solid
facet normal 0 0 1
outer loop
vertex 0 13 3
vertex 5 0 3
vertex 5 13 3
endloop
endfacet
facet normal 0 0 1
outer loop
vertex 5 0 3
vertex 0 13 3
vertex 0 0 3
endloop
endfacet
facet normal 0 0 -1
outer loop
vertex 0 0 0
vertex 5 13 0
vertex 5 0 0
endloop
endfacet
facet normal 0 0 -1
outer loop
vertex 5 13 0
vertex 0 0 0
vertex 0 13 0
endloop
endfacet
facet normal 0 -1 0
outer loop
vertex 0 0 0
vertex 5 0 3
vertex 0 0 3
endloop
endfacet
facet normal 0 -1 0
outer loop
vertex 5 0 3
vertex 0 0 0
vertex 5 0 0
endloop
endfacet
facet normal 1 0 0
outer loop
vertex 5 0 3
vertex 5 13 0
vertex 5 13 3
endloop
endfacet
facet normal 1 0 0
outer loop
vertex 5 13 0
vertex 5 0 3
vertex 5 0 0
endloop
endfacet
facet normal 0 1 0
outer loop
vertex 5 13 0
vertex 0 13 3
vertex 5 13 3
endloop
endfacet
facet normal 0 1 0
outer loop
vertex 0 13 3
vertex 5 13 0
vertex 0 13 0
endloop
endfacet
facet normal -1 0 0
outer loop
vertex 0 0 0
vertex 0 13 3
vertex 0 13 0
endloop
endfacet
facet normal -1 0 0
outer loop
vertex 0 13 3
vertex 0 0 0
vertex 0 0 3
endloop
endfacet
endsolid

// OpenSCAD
// Generated by SolidPython 1.0.1 on 2020-07-29 00:46:54


cube(size = [5, 13, 3]);
/***********************************************
*********      SolidPython code:      **********
************************************************
 
# import packages: SolidPython
from solid import *
from solid.utils import *
from itertools import chain, combinations, permutations


class Resize:

    def __init__(self, scad_file):
        self.scad_file = scad_file
        #self.scad_file = import_scad(scad_file)
        # cone/cylinder param:
        self.r1 = 0
        self.r2 = 0
        self.h = 0
        # rectangular prism param:
        self.w = 0
        self.l = 0
        # ellipse param:
        self.r = 0

    # import OpenScad code (file name corresponds to shape)


    # classify shape + parameters
    def assign(self, param1, param2, param3):
        if self.scad_file == 'cone.scad':
            self.r1 = param1
            self.r2 = param2
            self.h = param3
        elif self.scad_file == 'cylinder.scad':
            self.r1 = param1
            self.r2 = param2
            self.h = param3
        elif self.scad_file == 'rectangularPrism.scad':
            self.h = param1
            self.l = param2
            self.w = param3
        else:
            self.r = param1
            self.h = param2

    # resize parameters
    def iterate(self):
        x = range(3, 20, 2)
        i = 1
        if self.scad_file == 'cone.scad':
            tempList = list(permutations(x, 2))
            for temp in tempList:
                param1 = temp[0]
                param2 = temp[1]
                filepath = 'produced_scad_files/' + 'cone' + str(param1) + '_' + str(param2) + '_' + '.scad'
                scad_render_to_file(cylinder(h=param1, r1=param2, r2=0), filepath)

        elif self.scad_file == 'cylinder.scad':
            tempList = list(permutations(x, 3))
            for temp in tempList:
                param1 = temp[0]
                param2 = temp[1]
                filepath = 'produced_scad_files/' + 'cylinder' + str(param1) + '_' + str(param2) + '_' + '.scad'
                scad_render_to_file(cylinder(h=param1, r1=param2, r2=param2), filepath)

        elif self.scad_file == 'rectangularPrism.scad':
            tempList = list(permutations(x, 3))
            for temp in tempList:
                param1 = temp[0]
                param2 = temp[1]
                param3 = temp[2]
                filepath = 'produced_scad_files/' + 'rectangularPrism' + str(param1) + '_' + str(param2) + '_' + str(
                    param3) + '.scad'
                scad_render_to_file(cube(size=(param1, param2, param3)), filepath)

        elif self.scad_file == 'ellipse.scad':
            tempList = list(permutations(x, 4))
            for temp in tempList:
                param1 = temp[0]
                param2 = temp[1]
                param3 = temp[2]
                param4 = temp[3]
                filepath = 'produced_scad_files/' + 'ellipse' + str(param1) + '_' + str(param2) + '_' + str(param3) + '_' + str(param4) + '.scad'
                scad_render_to_file(scale([param1, param2, param3])(sphere(r=param4)), filepath)

    def render_to_scadfile(self):
        scad_render_to_file(scad, 'example.scad') 
 
************************************************/
